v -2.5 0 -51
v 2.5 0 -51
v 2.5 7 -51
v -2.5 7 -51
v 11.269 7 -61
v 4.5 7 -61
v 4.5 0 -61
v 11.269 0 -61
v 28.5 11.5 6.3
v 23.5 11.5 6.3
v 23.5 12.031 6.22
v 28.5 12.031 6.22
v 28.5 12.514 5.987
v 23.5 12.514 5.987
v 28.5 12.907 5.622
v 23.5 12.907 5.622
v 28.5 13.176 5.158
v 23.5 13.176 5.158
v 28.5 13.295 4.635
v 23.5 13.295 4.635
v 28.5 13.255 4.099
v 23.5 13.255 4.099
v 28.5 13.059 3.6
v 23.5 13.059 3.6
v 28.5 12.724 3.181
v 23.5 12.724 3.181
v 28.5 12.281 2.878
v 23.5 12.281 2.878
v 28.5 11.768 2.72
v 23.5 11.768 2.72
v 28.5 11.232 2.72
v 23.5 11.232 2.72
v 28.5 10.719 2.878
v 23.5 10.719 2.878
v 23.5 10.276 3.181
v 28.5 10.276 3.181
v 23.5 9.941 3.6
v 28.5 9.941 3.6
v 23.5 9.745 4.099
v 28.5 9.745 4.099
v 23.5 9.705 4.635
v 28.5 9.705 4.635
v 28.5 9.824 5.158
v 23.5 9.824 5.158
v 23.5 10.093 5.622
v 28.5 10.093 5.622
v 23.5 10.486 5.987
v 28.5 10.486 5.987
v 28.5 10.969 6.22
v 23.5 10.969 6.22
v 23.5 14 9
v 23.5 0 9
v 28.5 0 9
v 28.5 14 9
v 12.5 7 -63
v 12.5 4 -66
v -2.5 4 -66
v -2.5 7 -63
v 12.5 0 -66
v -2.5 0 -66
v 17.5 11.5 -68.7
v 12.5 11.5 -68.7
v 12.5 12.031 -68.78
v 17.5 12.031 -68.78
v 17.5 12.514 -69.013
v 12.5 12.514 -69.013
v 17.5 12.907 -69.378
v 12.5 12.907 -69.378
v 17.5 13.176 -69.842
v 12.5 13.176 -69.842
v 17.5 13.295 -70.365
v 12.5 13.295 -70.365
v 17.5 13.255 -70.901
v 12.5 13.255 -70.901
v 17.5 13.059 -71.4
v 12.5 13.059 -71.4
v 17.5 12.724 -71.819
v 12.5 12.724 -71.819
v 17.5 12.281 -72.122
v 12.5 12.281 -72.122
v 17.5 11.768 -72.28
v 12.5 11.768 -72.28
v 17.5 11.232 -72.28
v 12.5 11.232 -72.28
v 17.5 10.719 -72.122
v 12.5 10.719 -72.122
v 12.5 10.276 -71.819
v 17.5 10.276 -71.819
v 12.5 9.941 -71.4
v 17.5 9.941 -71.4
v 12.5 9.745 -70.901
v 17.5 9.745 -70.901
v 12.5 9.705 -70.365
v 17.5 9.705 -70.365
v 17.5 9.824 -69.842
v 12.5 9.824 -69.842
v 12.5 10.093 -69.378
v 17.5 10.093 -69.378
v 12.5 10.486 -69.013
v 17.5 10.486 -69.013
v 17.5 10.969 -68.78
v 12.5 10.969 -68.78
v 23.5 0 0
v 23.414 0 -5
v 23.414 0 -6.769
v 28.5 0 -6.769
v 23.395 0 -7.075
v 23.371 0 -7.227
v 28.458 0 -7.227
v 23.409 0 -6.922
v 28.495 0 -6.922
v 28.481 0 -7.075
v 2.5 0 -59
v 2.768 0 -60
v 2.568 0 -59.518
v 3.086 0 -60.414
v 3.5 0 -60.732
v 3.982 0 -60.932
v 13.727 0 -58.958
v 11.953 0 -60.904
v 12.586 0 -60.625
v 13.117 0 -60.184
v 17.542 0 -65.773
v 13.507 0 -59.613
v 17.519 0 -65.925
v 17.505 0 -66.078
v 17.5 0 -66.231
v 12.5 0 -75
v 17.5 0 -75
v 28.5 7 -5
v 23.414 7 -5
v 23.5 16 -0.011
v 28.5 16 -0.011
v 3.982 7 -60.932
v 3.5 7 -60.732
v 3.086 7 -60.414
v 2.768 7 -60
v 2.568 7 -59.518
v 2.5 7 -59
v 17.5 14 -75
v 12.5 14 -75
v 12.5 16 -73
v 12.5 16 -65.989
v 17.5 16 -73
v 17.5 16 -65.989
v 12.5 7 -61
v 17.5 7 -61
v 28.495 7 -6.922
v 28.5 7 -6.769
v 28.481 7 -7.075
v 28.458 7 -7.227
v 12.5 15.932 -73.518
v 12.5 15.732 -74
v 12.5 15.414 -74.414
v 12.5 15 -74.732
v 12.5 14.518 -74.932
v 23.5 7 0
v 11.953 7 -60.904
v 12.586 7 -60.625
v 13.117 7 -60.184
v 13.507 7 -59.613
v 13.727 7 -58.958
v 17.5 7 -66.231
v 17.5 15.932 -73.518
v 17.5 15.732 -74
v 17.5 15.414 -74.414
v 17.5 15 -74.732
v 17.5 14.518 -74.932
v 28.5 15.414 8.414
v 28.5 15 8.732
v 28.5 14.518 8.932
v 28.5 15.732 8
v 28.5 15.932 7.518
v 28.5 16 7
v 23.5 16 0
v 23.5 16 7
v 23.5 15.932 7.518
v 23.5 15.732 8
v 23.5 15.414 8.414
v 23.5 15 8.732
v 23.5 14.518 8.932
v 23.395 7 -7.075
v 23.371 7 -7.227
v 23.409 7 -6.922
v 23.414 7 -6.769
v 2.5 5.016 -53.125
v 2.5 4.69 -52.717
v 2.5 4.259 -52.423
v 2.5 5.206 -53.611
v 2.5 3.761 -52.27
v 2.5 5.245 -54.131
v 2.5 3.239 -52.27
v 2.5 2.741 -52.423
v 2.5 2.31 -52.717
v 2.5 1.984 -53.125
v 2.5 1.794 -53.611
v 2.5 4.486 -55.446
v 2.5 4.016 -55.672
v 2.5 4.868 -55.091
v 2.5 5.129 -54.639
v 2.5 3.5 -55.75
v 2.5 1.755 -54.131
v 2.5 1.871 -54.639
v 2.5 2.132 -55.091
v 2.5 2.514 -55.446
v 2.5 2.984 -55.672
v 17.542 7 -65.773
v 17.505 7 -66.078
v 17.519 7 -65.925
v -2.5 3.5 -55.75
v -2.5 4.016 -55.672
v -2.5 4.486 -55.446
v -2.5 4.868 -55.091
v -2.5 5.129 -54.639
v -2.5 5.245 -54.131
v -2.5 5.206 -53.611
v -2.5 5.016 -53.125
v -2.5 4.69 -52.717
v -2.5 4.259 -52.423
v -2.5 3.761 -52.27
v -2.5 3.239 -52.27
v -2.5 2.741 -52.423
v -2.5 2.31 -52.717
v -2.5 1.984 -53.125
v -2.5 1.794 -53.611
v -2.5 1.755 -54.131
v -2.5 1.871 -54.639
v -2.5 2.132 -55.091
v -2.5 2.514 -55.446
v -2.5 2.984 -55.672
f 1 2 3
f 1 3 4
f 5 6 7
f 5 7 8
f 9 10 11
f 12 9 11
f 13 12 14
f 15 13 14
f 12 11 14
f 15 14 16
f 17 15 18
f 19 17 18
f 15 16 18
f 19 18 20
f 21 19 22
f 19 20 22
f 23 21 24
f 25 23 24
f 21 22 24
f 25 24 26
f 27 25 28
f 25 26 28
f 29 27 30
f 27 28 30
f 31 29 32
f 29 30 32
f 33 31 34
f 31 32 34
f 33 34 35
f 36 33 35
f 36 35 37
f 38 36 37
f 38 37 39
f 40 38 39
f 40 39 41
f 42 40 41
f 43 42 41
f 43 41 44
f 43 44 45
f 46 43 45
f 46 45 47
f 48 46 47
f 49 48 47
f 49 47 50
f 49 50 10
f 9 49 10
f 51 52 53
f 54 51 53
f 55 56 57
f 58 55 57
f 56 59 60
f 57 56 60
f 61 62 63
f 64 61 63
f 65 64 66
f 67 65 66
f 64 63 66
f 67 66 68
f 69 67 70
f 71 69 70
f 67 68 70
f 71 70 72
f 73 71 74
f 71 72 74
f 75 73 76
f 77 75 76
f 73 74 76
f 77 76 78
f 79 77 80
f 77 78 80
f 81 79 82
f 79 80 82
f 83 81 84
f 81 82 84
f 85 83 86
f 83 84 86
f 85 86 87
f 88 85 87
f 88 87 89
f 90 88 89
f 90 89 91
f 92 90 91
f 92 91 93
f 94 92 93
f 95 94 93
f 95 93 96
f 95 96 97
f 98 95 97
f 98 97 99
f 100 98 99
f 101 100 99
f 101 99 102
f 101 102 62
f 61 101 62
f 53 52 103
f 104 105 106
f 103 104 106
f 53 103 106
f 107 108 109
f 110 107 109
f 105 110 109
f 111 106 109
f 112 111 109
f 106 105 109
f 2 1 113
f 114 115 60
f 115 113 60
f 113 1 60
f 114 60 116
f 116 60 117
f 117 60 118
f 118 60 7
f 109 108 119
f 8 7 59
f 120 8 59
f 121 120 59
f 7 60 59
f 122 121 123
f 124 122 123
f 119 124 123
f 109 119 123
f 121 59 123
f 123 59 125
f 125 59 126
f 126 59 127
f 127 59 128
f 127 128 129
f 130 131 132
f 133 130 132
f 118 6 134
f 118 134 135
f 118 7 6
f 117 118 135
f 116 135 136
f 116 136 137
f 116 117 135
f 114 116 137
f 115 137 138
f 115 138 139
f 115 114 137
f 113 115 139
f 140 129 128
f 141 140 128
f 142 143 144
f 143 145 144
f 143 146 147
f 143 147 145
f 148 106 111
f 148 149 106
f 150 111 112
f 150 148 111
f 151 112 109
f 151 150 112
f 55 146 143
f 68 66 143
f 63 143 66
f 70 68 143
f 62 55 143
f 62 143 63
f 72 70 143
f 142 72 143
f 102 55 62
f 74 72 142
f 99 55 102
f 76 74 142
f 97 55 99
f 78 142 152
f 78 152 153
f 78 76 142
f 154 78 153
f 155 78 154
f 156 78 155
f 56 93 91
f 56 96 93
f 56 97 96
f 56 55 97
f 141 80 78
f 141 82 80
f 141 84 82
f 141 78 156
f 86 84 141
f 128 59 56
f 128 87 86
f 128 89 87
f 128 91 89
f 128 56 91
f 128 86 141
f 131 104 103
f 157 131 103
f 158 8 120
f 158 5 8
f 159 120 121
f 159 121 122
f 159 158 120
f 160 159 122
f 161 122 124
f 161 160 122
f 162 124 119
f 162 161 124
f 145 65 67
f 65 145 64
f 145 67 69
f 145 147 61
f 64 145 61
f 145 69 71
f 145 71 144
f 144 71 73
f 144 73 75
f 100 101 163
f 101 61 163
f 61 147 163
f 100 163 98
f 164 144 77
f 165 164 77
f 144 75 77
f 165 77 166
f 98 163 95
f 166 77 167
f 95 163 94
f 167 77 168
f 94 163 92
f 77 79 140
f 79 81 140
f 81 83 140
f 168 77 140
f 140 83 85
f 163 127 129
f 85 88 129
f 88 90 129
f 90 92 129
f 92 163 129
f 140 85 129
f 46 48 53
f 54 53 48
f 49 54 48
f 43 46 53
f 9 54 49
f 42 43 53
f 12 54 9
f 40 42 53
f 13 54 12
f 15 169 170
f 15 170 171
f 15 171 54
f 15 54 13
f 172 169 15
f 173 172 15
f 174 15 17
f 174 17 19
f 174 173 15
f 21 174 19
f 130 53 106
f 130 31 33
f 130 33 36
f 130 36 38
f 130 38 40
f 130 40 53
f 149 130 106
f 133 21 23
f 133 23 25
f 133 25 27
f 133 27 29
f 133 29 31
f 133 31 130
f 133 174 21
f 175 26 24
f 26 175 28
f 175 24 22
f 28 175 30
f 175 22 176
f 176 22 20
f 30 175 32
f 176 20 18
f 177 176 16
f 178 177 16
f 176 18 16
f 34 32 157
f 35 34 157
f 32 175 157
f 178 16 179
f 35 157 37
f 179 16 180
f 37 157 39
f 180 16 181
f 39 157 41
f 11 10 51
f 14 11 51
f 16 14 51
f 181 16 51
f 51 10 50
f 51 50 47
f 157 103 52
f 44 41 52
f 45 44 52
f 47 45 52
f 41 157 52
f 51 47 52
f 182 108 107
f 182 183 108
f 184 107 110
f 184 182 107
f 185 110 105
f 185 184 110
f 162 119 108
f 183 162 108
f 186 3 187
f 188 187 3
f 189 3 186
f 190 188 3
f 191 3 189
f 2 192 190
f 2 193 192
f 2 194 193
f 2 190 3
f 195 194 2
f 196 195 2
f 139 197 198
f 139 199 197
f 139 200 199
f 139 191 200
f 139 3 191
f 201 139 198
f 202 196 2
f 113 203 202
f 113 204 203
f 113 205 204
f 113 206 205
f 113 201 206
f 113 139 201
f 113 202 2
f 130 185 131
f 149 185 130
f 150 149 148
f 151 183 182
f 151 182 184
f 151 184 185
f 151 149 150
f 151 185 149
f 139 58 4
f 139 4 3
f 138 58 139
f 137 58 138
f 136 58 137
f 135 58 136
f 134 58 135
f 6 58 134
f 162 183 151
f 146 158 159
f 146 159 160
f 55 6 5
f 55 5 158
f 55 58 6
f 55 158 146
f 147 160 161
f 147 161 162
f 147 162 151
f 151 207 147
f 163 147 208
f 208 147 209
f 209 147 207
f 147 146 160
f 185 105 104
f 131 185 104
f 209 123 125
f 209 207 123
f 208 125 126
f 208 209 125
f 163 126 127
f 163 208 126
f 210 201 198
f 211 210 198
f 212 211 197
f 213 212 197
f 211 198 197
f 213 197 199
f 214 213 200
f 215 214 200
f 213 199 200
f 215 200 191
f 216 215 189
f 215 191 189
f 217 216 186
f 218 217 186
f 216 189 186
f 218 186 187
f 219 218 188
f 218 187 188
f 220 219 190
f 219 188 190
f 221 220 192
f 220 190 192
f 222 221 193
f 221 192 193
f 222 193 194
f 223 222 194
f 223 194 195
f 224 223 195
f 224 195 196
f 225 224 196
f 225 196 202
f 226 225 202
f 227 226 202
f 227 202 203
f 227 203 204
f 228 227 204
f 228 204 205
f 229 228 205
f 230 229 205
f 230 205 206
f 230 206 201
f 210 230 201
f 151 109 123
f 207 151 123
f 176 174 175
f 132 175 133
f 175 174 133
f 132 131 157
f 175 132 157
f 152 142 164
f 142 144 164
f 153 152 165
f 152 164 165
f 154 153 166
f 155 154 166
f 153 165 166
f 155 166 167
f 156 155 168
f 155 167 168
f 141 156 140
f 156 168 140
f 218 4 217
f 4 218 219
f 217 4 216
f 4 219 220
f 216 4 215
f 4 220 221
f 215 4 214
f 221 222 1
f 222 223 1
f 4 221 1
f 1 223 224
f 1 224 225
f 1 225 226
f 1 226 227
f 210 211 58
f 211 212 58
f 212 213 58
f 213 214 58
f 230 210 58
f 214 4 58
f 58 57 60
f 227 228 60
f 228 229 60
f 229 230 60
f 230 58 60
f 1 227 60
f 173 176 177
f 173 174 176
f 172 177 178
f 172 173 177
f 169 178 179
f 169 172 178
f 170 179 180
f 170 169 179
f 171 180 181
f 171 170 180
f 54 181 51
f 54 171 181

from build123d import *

# Parameters (mm, degrees)
BOSS_EXTRUDE1_DEPTH  = 7
BOSS_EXTRUDE2_START  = 7
SKETCH1_3_W          = 5
SKETCH1_3_H          = 9
BOSS_EXTRUDE2_DEPTH  = 9
M3_CLEARANCE_HOLE1_D = 3.6
FILLET2_R            = 2.5
CHAMFER3_SIZE        = 5
CHAMFER3_SIZE_2      = 9.020238776
CHAMFER2_SIZE        = 3
SKETCH6_W            = 5
SKETCH6_H            = 7
BOSS_EXTRUDE3_DEPTH  = 10
SKETCH7_R            = 1.75
CUT_EXTRUDE1_DEPTH   = 10
FILLET6_R            = 2
SKETCH8_W            = 84
SKETCH8_H            = 16
CUT_EXTRUDE2_DEPTH   = 26
FILLET8_R            = 2


with BuildPart() as part:
    # Sketch1 → Boss-Extrude1 (new body)
    with BuildSketch(Plane(origin=(0, 0, 0), x_dir=(1, 0, 0), z_dir=(0, 1, 0))):
        Polygon((-23.5, -9), (-23.5, 0), (-23.413842004, 5), (-23.413842004, 7), (-13.346045394, 61), (13.346045394, 61), (23.413842004, 7), (23.413842004, 5), (23.5, 0), (23.5, -9), (28.5, -9), (28.5, 7), (17.5, 66), (17.5, 75), (12.5, 75), (12.5, 66), (-12.5, 66), (-12.5, 75), (-17.5, 75), (-17.5, 66), (-28.5, 7), (-28.5, -9), align=None)
    extrude(amount=BOSS_EXTRUDE1_DEPTH)

    # Sketch1<3> → Boss-Extrude2 (add)
    with BuildSketch(Plane(origin=(0, 0, 0), x_dir=(1, 0, 0), z_dir=(0, 1, 0)).offset(BOSS_EXTRUDE2_START)):
        with Locations((-15, 70.5)):
            Rectangle(SKETCH1_3_W, SKETCH1_3_H)
        with Locations((15, 70.5)):
            Rectangle(SKETCH1_3_W, SKETCH1_3_H)
        with Locations((-26, -4.5)):
            Rectangle(SKETCH1_3_W, SKETCH1_3_H)
        with Locations((26, -4.5)):
            Rectangle(SKETCH1_3_W, SKETCH1_3_H)
    extrude(amount=BOSS_EXTRUDE2_DEPTH)

    # M3 Clearance Hole1 (through all)
    with Locations(Plane(origin=(28.5, 0, 0), x_dir=(0, 0, -1), z_dir=(1, 0, 0))):
        with Locations((-4.5, 11.5), (70.5, 11.5)):
            Hole(M3_CLEARANCE_HOLE1_D / 2)

    # Fillet2
    fillet2_edges = [part.edges().sort_by_distance(p)[0] for p in [
        (-28.5, 3.5, -7),
        (-17.5, 3.5, -66),
        (17.5, 3.5, -66),
        (28.5, 3.5, -7),
        (23.413842004, 3.5, -5),
        (23.413842004, 3.5, -7),
        (13.346045394, 3.5, -61),
        (-13.346045394, 3.5, -61),
        (-23.413842004, 3.5, -7),
        (-23.413842004, 3.5, -5),
    ]]
    fillet(fillet2_edges, radius=FILLET2_R)

    # Chamfer3
    # the kernel refuses this chamfer: 9.020238776, 5 mm, written as the material it adds along each edge
    with BuildSketch(Plane(origin=(0.156378648, 7, 0), x_dir=(1.7315070193455174e-15, -0.060867759165289366, -0.9981458389905739), z_dir=(1, 0, 0))) as chamfer3_piece_1_section:
        Polygon((CHAMFER3_SIZE * 0.998145838991, CHAMFER3_SIZE * 0.0608677591653), (-CHAMFER3_SIZE_2 * 0.0608677591677, CHAMFER3_SIZE_2 * 0.99814583903), (0, 0), align=None)
    chamfer3_piece_1 = extrude(amount=28.343621352, mode=Mode.PRIVATE)
    chamfer3_piece_1 = split(chamfer3_piece_1, bisect_by=Plane(origin=(23.456927395, 9.255059618, -2.499628978), z_dir=(0.9998515690487569, 0, -0.017229041492165368)), keep=Keep.TOP, mode=Mode.PRIVATE)
    chamfer3_piece_1 = split(chamfer3_piece_1, bisect_by=Plane(origin=(23.478460501, 16, -2.500000028), z_dir=(0, -1, 0)), keep=Keep.TOP, mode=Mode.PRIVATE)
    add(chamfer3_piece_1)
    with BuildSketch(Plane(origin=(12.5, 7, -66), x_dir=(0, -0.06086775916528939, 0.9981458389905739), z_dir=(1, 0, 0))) as chamfer3_piece_2_section:
        Polygon((CHAMFER3_SIZE * 0.998145838991, -CHAMFER3_SIZE * 0.0608677591653), (-CHAMFER3_SIZE_2 * 0.0608677591677, -CHAMFER3_SIZE_2 * 0.99814583903), (0, 0), align=None)
    chamfer3_piece_2 = extrude(amount=5, mode=Mode.PRIVATE)
    chamfer3_piece_2 = split(chamfer3_piece_2, bisect_by=Plane(origin=(15, 16, -64.333324962), z_dir=(0, -1, 0)), keep=Keep.TOP, mode=Mode.PRIVATE)
    add(chamfer3_piece_2)

    # Chamfer2
    chamfer2_edges = [part.edges().sort_by_distance(p)[0] for p in [
        (0, 7, -66),
    ]]
    chamfer(chamfer2_edges, length=CHAMFER2_SIZE)

    # Sketch6 → Boss-Extrude3 (add)
    with BuildSketch(Plane(origin=(0, 0, -61), x_dir=(-1, 0, 0), z_dir=(0, 0, 1))):
        with Locations((0, -3.5)):
            Rectangle(SKETCH6_W, SKETCH6_H)
    extrude(amount=BOSS_EXTRUDE3_DEPTH)

    # Sketch7 → Cut-Extrude1 (cut)
    with BuildSketch(Plane(origin=(2.5, 0, 0), x_dir=(0, 0, -1), z_dir=(1, 0, 0))):
        with Locations((54, 3.5)):
            Circle(SKETCH7_R)
    extrude(amount=-CUT_EXTRUDE1_DEPTH, mode=Mode.SUBTRACT)

    # Fillet6
    fillet6_edges = [part.edges().sort_by_distance(p)[0] for p in [
        (26, 16, 9),
        (-15, 16, -75),
        (15, 16, -75),
        (-26, 16, 9),
    ]]
    fillet(fillet6_edges, radius=FILLET6_R)

    # Sketch8 → Cut-Extrude2 (cut)
    with BuildSketch(Plane.ZY.offset(28.5)):
        with Locations((-33, 8)):
            Rectangle(SKETCH8_W, SKETCH8_H)
    extrude(amount=-CUT_EXTRUDE2_DEPTH, mode=Mode.SUBTRACT)

    # Fillet8
    fillet8_edges = [part.edges().sort_by_distance(p)[0] for p in [
        (2.5, 3.5, -61),
    ]]
    fillet(fillet8_edges, radius=FILLET8_R)


solid = part.part
